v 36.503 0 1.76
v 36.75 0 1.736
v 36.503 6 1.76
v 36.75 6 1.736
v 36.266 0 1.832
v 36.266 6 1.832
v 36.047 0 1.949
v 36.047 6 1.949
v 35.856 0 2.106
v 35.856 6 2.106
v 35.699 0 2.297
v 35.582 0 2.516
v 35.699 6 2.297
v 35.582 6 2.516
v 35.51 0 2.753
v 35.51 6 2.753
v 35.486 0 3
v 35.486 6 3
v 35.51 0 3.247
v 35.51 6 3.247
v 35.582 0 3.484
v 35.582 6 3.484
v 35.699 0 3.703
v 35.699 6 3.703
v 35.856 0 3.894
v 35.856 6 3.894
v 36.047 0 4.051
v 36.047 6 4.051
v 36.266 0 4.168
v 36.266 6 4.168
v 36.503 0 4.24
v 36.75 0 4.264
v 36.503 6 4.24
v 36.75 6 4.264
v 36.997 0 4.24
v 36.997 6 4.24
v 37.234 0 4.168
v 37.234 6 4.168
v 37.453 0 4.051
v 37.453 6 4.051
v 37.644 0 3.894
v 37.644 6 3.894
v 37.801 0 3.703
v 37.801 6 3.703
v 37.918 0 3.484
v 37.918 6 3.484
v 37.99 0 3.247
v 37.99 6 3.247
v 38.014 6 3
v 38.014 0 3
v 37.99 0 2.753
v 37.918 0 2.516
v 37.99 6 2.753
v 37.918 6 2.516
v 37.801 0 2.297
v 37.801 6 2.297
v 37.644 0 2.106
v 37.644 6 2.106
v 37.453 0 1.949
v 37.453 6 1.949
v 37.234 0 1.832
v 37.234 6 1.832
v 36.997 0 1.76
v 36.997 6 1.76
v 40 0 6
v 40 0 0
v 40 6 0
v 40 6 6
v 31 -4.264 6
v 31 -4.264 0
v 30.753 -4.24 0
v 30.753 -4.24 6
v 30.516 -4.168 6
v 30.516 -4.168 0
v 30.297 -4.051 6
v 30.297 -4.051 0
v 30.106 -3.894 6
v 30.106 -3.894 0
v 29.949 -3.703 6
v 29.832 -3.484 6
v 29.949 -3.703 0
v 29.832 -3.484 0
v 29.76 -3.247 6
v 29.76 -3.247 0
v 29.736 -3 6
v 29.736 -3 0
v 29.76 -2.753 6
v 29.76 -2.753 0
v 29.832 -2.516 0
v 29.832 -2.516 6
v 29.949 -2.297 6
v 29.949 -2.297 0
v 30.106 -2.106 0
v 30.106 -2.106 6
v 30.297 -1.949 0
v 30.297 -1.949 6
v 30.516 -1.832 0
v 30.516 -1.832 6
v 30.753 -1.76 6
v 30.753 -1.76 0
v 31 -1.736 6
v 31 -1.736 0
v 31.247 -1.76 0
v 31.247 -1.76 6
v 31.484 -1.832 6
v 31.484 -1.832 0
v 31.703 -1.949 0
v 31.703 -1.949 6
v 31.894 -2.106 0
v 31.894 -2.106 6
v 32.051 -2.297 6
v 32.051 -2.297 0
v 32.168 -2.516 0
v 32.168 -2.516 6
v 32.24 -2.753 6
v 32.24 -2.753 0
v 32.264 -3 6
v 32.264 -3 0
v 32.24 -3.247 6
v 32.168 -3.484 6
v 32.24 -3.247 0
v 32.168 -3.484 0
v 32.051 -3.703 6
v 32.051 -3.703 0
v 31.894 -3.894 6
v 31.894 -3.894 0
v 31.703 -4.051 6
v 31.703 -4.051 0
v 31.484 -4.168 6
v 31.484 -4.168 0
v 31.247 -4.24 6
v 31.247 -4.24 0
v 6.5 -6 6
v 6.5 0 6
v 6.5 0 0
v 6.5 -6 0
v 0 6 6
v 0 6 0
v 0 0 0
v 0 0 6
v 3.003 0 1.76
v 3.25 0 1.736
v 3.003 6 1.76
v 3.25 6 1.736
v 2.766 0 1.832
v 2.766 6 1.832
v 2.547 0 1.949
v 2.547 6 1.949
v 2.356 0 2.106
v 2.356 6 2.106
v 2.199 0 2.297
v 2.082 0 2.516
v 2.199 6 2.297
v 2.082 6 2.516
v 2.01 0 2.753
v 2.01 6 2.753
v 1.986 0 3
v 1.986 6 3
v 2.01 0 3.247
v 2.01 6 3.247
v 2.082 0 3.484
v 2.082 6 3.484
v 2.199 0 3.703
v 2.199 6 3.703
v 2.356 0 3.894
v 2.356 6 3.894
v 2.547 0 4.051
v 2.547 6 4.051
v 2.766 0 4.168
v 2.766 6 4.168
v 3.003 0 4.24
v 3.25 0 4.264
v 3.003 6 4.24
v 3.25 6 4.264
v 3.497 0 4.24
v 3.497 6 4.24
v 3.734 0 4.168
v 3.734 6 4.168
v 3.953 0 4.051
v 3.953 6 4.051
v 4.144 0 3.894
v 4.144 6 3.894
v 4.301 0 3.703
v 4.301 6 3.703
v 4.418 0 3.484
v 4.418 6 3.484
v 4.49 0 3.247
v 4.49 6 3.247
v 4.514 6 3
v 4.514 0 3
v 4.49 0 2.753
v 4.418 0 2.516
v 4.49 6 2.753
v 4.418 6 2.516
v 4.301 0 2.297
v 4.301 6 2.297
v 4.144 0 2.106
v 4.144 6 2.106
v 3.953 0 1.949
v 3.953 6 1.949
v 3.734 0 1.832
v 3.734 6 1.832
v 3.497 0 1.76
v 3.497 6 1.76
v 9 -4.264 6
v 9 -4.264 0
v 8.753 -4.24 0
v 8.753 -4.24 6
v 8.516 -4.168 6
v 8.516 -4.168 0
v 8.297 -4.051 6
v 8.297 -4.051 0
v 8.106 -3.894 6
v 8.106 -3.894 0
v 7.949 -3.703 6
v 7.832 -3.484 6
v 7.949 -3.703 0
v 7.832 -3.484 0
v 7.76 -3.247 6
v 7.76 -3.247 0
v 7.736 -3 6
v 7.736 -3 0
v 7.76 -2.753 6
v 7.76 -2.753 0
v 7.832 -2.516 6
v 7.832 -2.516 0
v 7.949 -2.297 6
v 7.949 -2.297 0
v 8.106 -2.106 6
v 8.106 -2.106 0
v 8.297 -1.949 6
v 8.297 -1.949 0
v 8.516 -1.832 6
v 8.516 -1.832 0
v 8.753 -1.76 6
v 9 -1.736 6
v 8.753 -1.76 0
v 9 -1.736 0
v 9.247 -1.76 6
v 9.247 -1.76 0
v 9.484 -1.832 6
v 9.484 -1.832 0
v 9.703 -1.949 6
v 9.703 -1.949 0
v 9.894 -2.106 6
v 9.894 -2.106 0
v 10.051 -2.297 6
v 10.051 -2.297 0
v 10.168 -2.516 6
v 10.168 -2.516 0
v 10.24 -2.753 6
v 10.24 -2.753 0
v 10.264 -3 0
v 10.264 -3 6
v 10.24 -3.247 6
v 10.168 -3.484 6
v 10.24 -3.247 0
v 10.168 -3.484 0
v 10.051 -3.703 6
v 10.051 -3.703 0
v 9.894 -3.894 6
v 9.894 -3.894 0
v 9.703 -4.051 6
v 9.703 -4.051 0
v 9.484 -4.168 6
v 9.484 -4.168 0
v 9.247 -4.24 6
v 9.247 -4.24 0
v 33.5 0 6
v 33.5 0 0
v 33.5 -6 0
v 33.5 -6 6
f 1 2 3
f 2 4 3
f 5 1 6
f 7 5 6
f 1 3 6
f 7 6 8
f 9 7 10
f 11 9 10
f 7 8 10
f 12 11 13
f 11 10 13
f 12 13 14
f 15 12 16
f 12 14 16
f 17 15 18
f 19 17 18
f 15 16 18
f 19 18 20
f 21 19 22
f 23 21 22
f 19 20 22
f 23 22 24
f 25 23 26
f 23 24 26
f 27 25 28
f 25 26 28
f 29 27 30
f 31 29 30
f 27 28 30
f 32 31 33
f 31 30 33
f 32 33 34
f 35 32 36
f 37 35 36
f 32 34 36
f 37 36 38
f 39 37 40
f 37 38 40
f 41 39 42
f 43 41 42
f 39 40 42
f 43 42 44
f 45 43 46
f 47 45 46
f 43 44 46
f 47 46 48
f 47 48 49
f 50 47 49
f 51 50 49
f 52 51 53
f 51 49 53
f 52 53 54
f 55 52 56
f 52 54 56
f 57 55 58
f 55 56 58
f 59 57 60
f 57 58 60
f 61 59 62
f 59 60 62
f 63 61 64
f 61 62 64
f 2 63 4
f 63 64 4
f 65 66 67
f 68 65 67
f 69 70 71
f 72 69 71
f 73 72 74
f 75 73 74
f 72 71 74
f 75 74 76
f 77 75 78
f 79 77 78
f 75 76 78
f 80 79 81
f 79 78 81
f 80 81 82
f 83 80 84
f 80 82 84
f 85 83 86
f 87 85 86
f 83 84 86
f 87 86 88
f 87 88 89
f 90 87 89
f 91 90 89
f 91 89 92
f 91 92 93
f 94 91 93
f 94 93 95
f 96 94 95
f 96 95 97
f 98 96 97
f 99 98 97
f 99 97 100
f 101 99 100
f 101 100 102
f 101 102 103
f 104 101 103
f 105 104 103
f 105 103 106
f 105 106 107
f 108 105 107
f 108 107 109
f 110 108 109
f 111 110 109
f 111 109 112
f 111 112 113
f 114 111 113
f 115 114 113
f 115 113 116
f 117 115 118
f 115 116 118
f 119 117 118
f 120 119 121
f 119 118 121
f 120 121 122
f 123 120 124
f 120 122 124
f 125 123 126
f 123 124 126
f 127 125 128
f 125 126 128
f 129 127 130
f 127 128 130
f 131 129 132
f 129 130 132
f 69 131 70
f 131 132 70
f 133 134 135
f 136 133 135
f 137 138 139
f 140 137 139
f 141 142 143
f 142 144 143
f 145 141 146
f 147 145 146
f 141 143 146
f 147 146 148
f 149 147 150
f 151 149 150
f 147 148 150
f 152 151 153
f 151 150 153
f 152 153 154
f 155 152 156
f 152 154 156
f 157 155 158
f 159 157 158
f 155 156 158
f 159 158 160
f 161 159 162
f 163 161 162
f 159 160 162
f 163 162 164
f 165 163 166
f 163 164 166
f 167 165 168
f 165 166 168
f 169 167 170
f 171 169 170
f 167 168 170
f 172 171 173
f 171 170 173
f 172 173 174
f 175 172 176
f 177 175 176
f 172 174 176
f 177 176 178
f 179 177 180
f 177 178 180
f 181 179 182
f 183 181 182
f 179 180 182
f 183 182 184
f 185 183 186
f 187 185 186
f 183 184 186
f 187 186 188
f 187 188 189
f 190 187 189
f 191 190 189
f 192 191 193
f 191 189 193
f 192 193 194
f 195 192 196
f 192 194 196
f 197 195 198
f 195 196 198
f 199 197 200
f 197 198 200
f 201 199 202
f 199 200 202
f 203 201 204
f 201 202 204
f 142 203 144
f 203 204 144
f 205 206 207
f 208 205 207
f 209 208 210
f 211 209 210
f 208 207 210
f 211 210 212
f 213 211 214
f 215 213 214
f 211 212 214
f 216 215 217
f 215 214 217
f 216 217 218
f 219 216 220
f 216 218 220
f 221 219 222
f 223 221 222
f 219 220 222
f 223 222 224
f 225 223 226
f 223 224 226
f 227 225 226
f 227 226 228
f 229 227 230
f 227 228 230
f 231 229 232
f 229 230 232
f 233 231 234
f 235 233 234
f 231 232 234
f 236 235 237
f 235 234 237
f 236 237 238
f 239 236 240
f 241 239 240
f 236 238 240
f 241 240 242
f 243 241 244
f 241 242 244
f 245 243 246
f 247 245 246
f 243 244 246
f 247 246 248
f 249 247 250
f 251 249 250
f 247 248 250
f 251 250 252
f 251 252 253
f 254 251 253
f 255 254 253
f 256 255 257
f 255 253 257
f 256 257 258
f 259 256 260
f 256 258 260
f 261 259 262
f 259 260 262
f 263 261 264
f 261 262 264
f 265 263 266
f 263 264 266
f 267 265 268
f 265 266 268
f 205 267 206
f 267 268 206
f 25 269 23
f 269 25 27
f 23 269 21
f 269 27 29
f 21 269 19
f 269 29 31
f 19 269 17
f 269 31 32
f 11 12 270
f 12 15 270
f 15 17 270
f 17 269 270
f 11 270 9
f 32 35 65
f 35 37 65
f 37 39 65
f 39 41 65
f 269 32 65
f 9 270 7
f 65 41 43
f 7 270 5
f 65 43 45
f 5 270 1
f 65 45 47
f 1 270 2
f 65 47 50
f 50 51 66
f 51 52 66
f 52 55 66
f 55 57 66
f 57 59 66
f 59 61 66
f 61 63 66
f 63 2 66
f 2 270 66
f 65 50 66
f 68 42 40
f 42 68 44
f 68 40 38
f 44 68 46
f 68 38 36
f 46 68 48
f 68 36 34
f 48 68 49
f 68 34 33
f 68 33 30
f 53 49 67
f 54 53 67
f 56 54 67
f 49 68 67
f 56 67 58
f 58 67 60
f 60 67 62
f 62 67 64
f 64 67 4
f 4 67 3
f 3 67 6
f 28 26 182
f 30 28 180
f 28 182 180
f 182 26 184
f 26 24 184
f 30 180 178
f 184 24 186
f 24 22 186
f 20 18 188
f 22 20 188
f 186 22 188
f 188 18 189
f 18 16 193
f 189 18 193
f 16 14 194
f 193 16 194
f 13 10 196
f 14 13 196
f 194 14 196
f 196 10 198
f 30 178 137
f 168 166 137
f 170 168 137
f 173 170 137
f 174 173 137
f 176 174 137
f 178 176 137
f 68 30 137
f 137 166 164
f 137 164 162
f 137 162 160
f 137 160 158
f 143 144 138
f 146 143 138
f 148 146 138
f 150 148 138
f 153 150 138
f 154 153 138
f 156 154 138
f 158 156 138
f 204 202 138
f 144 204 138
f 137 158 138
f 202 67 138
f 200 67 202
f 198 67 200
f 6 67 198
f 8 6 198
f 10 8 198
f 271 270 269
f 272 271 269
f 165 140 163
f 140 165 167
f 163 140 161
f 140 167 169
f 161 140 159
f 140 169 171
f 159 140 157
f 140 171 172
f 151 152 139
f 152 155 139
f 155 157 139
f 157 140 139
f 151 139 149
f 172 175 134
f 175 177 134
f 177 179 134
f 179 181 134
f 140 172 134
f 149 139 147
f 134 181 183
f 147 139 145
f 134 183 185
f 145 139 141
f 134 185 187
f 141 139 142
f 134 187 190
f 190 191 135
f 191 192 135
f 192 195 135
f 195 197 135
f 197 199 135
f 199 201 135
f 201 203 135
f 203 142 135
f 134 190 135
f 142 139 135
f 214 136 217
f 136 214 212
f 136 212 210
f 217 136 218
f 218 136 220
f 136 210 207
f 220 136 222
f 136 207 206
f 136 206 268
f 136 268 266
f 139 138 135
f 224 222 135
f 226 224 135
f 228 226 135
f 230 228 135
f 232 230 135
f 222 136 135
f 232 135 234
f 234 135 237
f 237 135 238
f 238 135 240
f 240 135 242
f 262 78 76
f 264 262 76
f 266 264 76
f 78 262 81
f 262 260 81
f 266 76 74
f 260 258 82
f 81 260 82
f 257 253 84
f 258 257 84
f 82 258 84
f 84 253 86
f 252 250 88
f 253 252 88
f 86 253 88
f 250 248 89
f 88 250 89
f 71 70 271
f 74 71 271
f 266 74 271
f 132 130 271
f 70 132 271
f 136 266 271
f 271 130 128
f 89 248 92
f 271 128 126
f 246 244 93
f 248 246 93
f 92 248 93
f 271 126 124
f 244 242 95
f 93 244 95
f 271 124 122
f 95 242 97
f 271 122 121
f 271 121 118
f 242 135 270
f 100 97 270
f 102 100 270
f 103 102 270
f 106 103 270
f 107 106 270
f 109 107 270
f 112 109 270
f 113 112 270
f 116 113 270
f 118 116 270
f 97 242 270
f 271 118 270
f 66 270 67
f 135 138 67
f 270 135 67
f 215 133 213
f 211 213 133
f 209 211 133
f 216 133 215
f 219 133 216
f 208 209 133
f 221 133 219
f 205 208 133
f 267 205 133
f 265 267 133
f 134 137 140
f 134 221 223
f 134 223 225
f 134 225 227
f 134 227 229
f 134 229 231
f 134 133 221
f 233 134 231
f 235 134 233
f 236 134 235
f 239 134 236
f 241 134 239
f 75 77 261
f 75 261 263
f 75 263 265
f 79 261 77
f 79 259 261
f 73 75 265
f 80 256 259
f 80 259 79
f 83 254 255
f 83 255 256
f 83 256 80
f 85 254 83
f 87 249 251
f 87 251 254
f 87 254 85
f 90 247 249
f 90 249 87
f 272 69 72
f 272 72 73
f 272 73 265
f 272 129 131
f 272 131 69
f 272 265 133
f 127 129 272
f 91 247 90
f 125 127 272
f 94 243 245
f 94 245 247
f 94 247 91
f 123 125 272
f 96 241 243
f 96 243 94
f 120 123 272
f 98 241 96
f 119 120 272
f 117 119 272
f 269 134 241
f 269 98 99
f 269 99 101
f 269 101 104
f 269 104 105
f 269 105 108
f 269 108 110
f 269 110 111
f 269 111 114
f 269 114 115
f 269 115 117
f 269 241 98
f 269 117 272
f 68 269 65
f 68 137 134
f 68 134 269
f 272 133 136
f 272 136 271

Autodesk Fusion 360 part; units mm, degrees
sketch "Sketch1" plane through (0, 0, 0) normal (0, 0, 1) x (1, 0, 0)
  line L0 (0, 0) -> (40, 0)
  line L1 (40, 0) -> (40, 6)
  line L2 (40, 6) -> (0, 6)
  line L3 (0, 6) -> (0, 0)
  dimension "d1" = 40
  dimension "d2" = 6
extrude "Extrude1" add sketch "Sketch1" along normal blind 6
sketch "Sketch2" plane through (0, 0, 0) normal (0, -1, 0) x (1, 0, 0)
  line L0 (0, 0) -> (40, 0)
  line L1 (40, 0) -> (40, 6)
  line L2 (40, 6) -> (0, 6)
  line L3 (0, 6) -> (0, 0)
  line L4 (6.5, 0) -> (33.5, 0)
  line L5 (33.5, 0) -> (33.5, 6)
  line L6 (33.5, 6) -> (6.5, 6)
  line L7 (6.5, 6) -> (6.5, 0)
  dimension "d5" = 27
  dimension "d6" = 6
extrude "Extrude2" add sketch "Sketch2" along normal blind 6 contours L0 L2 L4 L5 L6 L7
hole "Hole1" at (3.25, 0, 3) direction (0, 1, 0) diameter 2.529 depth 6 tip angle 118
hole "Hole2" at (36.75, 0, 3) direction (0, 1, 0) diameter 2.529 depth 6 tip angle 118
hole "Hole3" at (9, -3, 6) direction (0, 0, -1) diameter 2.529 depth 6 tip angle 118
hole "Hole4" at (31, -3, 6) direction (0, 0, -1) diameter 2.529 depth 6 tip angle 118
sketch "Sketch3" plane through (0, 6, 0) normal (0, 1, 0) x (-1, 0, 0)
  circle A0 centre (-36.75, 3) radius 1.2645
  circle A1 centre (-3.25, 3) radius 1.2645
  line L0 (-40, 0) -> (0, 0)
  line L1 (0, 0) -> (0, 6)
  line L2 (0, 6) -> (-40, 6)
  line L3 (-40, 6) -> (-40, 0)
  circle A2 centre (-20, 26) radius 25
  dimension "d29" = 50
sketch "Sketch4" plane through (0, -6, 0) normal (0, -1, 0) x (1, 0, 0)
  line L0 (6.5, 6) -> (6.5, 0)
  line L1 (6.5, 0) -> (33.5, 0)
  line L2 (33.5, 0) -> (33.5, 6)
  line L3 (33.5, 6) -> (6.5, 6)
  circle A0 centre (20, 11.5) radius 10.5
  dimension "d30" = 21
loft "Loft1" cut profiles "Sketch3", "Sketch4" section 1 contours L2 A2 | L2 A2 section 2 contours L3 A0 picked at (23.3871, 12.1316)
